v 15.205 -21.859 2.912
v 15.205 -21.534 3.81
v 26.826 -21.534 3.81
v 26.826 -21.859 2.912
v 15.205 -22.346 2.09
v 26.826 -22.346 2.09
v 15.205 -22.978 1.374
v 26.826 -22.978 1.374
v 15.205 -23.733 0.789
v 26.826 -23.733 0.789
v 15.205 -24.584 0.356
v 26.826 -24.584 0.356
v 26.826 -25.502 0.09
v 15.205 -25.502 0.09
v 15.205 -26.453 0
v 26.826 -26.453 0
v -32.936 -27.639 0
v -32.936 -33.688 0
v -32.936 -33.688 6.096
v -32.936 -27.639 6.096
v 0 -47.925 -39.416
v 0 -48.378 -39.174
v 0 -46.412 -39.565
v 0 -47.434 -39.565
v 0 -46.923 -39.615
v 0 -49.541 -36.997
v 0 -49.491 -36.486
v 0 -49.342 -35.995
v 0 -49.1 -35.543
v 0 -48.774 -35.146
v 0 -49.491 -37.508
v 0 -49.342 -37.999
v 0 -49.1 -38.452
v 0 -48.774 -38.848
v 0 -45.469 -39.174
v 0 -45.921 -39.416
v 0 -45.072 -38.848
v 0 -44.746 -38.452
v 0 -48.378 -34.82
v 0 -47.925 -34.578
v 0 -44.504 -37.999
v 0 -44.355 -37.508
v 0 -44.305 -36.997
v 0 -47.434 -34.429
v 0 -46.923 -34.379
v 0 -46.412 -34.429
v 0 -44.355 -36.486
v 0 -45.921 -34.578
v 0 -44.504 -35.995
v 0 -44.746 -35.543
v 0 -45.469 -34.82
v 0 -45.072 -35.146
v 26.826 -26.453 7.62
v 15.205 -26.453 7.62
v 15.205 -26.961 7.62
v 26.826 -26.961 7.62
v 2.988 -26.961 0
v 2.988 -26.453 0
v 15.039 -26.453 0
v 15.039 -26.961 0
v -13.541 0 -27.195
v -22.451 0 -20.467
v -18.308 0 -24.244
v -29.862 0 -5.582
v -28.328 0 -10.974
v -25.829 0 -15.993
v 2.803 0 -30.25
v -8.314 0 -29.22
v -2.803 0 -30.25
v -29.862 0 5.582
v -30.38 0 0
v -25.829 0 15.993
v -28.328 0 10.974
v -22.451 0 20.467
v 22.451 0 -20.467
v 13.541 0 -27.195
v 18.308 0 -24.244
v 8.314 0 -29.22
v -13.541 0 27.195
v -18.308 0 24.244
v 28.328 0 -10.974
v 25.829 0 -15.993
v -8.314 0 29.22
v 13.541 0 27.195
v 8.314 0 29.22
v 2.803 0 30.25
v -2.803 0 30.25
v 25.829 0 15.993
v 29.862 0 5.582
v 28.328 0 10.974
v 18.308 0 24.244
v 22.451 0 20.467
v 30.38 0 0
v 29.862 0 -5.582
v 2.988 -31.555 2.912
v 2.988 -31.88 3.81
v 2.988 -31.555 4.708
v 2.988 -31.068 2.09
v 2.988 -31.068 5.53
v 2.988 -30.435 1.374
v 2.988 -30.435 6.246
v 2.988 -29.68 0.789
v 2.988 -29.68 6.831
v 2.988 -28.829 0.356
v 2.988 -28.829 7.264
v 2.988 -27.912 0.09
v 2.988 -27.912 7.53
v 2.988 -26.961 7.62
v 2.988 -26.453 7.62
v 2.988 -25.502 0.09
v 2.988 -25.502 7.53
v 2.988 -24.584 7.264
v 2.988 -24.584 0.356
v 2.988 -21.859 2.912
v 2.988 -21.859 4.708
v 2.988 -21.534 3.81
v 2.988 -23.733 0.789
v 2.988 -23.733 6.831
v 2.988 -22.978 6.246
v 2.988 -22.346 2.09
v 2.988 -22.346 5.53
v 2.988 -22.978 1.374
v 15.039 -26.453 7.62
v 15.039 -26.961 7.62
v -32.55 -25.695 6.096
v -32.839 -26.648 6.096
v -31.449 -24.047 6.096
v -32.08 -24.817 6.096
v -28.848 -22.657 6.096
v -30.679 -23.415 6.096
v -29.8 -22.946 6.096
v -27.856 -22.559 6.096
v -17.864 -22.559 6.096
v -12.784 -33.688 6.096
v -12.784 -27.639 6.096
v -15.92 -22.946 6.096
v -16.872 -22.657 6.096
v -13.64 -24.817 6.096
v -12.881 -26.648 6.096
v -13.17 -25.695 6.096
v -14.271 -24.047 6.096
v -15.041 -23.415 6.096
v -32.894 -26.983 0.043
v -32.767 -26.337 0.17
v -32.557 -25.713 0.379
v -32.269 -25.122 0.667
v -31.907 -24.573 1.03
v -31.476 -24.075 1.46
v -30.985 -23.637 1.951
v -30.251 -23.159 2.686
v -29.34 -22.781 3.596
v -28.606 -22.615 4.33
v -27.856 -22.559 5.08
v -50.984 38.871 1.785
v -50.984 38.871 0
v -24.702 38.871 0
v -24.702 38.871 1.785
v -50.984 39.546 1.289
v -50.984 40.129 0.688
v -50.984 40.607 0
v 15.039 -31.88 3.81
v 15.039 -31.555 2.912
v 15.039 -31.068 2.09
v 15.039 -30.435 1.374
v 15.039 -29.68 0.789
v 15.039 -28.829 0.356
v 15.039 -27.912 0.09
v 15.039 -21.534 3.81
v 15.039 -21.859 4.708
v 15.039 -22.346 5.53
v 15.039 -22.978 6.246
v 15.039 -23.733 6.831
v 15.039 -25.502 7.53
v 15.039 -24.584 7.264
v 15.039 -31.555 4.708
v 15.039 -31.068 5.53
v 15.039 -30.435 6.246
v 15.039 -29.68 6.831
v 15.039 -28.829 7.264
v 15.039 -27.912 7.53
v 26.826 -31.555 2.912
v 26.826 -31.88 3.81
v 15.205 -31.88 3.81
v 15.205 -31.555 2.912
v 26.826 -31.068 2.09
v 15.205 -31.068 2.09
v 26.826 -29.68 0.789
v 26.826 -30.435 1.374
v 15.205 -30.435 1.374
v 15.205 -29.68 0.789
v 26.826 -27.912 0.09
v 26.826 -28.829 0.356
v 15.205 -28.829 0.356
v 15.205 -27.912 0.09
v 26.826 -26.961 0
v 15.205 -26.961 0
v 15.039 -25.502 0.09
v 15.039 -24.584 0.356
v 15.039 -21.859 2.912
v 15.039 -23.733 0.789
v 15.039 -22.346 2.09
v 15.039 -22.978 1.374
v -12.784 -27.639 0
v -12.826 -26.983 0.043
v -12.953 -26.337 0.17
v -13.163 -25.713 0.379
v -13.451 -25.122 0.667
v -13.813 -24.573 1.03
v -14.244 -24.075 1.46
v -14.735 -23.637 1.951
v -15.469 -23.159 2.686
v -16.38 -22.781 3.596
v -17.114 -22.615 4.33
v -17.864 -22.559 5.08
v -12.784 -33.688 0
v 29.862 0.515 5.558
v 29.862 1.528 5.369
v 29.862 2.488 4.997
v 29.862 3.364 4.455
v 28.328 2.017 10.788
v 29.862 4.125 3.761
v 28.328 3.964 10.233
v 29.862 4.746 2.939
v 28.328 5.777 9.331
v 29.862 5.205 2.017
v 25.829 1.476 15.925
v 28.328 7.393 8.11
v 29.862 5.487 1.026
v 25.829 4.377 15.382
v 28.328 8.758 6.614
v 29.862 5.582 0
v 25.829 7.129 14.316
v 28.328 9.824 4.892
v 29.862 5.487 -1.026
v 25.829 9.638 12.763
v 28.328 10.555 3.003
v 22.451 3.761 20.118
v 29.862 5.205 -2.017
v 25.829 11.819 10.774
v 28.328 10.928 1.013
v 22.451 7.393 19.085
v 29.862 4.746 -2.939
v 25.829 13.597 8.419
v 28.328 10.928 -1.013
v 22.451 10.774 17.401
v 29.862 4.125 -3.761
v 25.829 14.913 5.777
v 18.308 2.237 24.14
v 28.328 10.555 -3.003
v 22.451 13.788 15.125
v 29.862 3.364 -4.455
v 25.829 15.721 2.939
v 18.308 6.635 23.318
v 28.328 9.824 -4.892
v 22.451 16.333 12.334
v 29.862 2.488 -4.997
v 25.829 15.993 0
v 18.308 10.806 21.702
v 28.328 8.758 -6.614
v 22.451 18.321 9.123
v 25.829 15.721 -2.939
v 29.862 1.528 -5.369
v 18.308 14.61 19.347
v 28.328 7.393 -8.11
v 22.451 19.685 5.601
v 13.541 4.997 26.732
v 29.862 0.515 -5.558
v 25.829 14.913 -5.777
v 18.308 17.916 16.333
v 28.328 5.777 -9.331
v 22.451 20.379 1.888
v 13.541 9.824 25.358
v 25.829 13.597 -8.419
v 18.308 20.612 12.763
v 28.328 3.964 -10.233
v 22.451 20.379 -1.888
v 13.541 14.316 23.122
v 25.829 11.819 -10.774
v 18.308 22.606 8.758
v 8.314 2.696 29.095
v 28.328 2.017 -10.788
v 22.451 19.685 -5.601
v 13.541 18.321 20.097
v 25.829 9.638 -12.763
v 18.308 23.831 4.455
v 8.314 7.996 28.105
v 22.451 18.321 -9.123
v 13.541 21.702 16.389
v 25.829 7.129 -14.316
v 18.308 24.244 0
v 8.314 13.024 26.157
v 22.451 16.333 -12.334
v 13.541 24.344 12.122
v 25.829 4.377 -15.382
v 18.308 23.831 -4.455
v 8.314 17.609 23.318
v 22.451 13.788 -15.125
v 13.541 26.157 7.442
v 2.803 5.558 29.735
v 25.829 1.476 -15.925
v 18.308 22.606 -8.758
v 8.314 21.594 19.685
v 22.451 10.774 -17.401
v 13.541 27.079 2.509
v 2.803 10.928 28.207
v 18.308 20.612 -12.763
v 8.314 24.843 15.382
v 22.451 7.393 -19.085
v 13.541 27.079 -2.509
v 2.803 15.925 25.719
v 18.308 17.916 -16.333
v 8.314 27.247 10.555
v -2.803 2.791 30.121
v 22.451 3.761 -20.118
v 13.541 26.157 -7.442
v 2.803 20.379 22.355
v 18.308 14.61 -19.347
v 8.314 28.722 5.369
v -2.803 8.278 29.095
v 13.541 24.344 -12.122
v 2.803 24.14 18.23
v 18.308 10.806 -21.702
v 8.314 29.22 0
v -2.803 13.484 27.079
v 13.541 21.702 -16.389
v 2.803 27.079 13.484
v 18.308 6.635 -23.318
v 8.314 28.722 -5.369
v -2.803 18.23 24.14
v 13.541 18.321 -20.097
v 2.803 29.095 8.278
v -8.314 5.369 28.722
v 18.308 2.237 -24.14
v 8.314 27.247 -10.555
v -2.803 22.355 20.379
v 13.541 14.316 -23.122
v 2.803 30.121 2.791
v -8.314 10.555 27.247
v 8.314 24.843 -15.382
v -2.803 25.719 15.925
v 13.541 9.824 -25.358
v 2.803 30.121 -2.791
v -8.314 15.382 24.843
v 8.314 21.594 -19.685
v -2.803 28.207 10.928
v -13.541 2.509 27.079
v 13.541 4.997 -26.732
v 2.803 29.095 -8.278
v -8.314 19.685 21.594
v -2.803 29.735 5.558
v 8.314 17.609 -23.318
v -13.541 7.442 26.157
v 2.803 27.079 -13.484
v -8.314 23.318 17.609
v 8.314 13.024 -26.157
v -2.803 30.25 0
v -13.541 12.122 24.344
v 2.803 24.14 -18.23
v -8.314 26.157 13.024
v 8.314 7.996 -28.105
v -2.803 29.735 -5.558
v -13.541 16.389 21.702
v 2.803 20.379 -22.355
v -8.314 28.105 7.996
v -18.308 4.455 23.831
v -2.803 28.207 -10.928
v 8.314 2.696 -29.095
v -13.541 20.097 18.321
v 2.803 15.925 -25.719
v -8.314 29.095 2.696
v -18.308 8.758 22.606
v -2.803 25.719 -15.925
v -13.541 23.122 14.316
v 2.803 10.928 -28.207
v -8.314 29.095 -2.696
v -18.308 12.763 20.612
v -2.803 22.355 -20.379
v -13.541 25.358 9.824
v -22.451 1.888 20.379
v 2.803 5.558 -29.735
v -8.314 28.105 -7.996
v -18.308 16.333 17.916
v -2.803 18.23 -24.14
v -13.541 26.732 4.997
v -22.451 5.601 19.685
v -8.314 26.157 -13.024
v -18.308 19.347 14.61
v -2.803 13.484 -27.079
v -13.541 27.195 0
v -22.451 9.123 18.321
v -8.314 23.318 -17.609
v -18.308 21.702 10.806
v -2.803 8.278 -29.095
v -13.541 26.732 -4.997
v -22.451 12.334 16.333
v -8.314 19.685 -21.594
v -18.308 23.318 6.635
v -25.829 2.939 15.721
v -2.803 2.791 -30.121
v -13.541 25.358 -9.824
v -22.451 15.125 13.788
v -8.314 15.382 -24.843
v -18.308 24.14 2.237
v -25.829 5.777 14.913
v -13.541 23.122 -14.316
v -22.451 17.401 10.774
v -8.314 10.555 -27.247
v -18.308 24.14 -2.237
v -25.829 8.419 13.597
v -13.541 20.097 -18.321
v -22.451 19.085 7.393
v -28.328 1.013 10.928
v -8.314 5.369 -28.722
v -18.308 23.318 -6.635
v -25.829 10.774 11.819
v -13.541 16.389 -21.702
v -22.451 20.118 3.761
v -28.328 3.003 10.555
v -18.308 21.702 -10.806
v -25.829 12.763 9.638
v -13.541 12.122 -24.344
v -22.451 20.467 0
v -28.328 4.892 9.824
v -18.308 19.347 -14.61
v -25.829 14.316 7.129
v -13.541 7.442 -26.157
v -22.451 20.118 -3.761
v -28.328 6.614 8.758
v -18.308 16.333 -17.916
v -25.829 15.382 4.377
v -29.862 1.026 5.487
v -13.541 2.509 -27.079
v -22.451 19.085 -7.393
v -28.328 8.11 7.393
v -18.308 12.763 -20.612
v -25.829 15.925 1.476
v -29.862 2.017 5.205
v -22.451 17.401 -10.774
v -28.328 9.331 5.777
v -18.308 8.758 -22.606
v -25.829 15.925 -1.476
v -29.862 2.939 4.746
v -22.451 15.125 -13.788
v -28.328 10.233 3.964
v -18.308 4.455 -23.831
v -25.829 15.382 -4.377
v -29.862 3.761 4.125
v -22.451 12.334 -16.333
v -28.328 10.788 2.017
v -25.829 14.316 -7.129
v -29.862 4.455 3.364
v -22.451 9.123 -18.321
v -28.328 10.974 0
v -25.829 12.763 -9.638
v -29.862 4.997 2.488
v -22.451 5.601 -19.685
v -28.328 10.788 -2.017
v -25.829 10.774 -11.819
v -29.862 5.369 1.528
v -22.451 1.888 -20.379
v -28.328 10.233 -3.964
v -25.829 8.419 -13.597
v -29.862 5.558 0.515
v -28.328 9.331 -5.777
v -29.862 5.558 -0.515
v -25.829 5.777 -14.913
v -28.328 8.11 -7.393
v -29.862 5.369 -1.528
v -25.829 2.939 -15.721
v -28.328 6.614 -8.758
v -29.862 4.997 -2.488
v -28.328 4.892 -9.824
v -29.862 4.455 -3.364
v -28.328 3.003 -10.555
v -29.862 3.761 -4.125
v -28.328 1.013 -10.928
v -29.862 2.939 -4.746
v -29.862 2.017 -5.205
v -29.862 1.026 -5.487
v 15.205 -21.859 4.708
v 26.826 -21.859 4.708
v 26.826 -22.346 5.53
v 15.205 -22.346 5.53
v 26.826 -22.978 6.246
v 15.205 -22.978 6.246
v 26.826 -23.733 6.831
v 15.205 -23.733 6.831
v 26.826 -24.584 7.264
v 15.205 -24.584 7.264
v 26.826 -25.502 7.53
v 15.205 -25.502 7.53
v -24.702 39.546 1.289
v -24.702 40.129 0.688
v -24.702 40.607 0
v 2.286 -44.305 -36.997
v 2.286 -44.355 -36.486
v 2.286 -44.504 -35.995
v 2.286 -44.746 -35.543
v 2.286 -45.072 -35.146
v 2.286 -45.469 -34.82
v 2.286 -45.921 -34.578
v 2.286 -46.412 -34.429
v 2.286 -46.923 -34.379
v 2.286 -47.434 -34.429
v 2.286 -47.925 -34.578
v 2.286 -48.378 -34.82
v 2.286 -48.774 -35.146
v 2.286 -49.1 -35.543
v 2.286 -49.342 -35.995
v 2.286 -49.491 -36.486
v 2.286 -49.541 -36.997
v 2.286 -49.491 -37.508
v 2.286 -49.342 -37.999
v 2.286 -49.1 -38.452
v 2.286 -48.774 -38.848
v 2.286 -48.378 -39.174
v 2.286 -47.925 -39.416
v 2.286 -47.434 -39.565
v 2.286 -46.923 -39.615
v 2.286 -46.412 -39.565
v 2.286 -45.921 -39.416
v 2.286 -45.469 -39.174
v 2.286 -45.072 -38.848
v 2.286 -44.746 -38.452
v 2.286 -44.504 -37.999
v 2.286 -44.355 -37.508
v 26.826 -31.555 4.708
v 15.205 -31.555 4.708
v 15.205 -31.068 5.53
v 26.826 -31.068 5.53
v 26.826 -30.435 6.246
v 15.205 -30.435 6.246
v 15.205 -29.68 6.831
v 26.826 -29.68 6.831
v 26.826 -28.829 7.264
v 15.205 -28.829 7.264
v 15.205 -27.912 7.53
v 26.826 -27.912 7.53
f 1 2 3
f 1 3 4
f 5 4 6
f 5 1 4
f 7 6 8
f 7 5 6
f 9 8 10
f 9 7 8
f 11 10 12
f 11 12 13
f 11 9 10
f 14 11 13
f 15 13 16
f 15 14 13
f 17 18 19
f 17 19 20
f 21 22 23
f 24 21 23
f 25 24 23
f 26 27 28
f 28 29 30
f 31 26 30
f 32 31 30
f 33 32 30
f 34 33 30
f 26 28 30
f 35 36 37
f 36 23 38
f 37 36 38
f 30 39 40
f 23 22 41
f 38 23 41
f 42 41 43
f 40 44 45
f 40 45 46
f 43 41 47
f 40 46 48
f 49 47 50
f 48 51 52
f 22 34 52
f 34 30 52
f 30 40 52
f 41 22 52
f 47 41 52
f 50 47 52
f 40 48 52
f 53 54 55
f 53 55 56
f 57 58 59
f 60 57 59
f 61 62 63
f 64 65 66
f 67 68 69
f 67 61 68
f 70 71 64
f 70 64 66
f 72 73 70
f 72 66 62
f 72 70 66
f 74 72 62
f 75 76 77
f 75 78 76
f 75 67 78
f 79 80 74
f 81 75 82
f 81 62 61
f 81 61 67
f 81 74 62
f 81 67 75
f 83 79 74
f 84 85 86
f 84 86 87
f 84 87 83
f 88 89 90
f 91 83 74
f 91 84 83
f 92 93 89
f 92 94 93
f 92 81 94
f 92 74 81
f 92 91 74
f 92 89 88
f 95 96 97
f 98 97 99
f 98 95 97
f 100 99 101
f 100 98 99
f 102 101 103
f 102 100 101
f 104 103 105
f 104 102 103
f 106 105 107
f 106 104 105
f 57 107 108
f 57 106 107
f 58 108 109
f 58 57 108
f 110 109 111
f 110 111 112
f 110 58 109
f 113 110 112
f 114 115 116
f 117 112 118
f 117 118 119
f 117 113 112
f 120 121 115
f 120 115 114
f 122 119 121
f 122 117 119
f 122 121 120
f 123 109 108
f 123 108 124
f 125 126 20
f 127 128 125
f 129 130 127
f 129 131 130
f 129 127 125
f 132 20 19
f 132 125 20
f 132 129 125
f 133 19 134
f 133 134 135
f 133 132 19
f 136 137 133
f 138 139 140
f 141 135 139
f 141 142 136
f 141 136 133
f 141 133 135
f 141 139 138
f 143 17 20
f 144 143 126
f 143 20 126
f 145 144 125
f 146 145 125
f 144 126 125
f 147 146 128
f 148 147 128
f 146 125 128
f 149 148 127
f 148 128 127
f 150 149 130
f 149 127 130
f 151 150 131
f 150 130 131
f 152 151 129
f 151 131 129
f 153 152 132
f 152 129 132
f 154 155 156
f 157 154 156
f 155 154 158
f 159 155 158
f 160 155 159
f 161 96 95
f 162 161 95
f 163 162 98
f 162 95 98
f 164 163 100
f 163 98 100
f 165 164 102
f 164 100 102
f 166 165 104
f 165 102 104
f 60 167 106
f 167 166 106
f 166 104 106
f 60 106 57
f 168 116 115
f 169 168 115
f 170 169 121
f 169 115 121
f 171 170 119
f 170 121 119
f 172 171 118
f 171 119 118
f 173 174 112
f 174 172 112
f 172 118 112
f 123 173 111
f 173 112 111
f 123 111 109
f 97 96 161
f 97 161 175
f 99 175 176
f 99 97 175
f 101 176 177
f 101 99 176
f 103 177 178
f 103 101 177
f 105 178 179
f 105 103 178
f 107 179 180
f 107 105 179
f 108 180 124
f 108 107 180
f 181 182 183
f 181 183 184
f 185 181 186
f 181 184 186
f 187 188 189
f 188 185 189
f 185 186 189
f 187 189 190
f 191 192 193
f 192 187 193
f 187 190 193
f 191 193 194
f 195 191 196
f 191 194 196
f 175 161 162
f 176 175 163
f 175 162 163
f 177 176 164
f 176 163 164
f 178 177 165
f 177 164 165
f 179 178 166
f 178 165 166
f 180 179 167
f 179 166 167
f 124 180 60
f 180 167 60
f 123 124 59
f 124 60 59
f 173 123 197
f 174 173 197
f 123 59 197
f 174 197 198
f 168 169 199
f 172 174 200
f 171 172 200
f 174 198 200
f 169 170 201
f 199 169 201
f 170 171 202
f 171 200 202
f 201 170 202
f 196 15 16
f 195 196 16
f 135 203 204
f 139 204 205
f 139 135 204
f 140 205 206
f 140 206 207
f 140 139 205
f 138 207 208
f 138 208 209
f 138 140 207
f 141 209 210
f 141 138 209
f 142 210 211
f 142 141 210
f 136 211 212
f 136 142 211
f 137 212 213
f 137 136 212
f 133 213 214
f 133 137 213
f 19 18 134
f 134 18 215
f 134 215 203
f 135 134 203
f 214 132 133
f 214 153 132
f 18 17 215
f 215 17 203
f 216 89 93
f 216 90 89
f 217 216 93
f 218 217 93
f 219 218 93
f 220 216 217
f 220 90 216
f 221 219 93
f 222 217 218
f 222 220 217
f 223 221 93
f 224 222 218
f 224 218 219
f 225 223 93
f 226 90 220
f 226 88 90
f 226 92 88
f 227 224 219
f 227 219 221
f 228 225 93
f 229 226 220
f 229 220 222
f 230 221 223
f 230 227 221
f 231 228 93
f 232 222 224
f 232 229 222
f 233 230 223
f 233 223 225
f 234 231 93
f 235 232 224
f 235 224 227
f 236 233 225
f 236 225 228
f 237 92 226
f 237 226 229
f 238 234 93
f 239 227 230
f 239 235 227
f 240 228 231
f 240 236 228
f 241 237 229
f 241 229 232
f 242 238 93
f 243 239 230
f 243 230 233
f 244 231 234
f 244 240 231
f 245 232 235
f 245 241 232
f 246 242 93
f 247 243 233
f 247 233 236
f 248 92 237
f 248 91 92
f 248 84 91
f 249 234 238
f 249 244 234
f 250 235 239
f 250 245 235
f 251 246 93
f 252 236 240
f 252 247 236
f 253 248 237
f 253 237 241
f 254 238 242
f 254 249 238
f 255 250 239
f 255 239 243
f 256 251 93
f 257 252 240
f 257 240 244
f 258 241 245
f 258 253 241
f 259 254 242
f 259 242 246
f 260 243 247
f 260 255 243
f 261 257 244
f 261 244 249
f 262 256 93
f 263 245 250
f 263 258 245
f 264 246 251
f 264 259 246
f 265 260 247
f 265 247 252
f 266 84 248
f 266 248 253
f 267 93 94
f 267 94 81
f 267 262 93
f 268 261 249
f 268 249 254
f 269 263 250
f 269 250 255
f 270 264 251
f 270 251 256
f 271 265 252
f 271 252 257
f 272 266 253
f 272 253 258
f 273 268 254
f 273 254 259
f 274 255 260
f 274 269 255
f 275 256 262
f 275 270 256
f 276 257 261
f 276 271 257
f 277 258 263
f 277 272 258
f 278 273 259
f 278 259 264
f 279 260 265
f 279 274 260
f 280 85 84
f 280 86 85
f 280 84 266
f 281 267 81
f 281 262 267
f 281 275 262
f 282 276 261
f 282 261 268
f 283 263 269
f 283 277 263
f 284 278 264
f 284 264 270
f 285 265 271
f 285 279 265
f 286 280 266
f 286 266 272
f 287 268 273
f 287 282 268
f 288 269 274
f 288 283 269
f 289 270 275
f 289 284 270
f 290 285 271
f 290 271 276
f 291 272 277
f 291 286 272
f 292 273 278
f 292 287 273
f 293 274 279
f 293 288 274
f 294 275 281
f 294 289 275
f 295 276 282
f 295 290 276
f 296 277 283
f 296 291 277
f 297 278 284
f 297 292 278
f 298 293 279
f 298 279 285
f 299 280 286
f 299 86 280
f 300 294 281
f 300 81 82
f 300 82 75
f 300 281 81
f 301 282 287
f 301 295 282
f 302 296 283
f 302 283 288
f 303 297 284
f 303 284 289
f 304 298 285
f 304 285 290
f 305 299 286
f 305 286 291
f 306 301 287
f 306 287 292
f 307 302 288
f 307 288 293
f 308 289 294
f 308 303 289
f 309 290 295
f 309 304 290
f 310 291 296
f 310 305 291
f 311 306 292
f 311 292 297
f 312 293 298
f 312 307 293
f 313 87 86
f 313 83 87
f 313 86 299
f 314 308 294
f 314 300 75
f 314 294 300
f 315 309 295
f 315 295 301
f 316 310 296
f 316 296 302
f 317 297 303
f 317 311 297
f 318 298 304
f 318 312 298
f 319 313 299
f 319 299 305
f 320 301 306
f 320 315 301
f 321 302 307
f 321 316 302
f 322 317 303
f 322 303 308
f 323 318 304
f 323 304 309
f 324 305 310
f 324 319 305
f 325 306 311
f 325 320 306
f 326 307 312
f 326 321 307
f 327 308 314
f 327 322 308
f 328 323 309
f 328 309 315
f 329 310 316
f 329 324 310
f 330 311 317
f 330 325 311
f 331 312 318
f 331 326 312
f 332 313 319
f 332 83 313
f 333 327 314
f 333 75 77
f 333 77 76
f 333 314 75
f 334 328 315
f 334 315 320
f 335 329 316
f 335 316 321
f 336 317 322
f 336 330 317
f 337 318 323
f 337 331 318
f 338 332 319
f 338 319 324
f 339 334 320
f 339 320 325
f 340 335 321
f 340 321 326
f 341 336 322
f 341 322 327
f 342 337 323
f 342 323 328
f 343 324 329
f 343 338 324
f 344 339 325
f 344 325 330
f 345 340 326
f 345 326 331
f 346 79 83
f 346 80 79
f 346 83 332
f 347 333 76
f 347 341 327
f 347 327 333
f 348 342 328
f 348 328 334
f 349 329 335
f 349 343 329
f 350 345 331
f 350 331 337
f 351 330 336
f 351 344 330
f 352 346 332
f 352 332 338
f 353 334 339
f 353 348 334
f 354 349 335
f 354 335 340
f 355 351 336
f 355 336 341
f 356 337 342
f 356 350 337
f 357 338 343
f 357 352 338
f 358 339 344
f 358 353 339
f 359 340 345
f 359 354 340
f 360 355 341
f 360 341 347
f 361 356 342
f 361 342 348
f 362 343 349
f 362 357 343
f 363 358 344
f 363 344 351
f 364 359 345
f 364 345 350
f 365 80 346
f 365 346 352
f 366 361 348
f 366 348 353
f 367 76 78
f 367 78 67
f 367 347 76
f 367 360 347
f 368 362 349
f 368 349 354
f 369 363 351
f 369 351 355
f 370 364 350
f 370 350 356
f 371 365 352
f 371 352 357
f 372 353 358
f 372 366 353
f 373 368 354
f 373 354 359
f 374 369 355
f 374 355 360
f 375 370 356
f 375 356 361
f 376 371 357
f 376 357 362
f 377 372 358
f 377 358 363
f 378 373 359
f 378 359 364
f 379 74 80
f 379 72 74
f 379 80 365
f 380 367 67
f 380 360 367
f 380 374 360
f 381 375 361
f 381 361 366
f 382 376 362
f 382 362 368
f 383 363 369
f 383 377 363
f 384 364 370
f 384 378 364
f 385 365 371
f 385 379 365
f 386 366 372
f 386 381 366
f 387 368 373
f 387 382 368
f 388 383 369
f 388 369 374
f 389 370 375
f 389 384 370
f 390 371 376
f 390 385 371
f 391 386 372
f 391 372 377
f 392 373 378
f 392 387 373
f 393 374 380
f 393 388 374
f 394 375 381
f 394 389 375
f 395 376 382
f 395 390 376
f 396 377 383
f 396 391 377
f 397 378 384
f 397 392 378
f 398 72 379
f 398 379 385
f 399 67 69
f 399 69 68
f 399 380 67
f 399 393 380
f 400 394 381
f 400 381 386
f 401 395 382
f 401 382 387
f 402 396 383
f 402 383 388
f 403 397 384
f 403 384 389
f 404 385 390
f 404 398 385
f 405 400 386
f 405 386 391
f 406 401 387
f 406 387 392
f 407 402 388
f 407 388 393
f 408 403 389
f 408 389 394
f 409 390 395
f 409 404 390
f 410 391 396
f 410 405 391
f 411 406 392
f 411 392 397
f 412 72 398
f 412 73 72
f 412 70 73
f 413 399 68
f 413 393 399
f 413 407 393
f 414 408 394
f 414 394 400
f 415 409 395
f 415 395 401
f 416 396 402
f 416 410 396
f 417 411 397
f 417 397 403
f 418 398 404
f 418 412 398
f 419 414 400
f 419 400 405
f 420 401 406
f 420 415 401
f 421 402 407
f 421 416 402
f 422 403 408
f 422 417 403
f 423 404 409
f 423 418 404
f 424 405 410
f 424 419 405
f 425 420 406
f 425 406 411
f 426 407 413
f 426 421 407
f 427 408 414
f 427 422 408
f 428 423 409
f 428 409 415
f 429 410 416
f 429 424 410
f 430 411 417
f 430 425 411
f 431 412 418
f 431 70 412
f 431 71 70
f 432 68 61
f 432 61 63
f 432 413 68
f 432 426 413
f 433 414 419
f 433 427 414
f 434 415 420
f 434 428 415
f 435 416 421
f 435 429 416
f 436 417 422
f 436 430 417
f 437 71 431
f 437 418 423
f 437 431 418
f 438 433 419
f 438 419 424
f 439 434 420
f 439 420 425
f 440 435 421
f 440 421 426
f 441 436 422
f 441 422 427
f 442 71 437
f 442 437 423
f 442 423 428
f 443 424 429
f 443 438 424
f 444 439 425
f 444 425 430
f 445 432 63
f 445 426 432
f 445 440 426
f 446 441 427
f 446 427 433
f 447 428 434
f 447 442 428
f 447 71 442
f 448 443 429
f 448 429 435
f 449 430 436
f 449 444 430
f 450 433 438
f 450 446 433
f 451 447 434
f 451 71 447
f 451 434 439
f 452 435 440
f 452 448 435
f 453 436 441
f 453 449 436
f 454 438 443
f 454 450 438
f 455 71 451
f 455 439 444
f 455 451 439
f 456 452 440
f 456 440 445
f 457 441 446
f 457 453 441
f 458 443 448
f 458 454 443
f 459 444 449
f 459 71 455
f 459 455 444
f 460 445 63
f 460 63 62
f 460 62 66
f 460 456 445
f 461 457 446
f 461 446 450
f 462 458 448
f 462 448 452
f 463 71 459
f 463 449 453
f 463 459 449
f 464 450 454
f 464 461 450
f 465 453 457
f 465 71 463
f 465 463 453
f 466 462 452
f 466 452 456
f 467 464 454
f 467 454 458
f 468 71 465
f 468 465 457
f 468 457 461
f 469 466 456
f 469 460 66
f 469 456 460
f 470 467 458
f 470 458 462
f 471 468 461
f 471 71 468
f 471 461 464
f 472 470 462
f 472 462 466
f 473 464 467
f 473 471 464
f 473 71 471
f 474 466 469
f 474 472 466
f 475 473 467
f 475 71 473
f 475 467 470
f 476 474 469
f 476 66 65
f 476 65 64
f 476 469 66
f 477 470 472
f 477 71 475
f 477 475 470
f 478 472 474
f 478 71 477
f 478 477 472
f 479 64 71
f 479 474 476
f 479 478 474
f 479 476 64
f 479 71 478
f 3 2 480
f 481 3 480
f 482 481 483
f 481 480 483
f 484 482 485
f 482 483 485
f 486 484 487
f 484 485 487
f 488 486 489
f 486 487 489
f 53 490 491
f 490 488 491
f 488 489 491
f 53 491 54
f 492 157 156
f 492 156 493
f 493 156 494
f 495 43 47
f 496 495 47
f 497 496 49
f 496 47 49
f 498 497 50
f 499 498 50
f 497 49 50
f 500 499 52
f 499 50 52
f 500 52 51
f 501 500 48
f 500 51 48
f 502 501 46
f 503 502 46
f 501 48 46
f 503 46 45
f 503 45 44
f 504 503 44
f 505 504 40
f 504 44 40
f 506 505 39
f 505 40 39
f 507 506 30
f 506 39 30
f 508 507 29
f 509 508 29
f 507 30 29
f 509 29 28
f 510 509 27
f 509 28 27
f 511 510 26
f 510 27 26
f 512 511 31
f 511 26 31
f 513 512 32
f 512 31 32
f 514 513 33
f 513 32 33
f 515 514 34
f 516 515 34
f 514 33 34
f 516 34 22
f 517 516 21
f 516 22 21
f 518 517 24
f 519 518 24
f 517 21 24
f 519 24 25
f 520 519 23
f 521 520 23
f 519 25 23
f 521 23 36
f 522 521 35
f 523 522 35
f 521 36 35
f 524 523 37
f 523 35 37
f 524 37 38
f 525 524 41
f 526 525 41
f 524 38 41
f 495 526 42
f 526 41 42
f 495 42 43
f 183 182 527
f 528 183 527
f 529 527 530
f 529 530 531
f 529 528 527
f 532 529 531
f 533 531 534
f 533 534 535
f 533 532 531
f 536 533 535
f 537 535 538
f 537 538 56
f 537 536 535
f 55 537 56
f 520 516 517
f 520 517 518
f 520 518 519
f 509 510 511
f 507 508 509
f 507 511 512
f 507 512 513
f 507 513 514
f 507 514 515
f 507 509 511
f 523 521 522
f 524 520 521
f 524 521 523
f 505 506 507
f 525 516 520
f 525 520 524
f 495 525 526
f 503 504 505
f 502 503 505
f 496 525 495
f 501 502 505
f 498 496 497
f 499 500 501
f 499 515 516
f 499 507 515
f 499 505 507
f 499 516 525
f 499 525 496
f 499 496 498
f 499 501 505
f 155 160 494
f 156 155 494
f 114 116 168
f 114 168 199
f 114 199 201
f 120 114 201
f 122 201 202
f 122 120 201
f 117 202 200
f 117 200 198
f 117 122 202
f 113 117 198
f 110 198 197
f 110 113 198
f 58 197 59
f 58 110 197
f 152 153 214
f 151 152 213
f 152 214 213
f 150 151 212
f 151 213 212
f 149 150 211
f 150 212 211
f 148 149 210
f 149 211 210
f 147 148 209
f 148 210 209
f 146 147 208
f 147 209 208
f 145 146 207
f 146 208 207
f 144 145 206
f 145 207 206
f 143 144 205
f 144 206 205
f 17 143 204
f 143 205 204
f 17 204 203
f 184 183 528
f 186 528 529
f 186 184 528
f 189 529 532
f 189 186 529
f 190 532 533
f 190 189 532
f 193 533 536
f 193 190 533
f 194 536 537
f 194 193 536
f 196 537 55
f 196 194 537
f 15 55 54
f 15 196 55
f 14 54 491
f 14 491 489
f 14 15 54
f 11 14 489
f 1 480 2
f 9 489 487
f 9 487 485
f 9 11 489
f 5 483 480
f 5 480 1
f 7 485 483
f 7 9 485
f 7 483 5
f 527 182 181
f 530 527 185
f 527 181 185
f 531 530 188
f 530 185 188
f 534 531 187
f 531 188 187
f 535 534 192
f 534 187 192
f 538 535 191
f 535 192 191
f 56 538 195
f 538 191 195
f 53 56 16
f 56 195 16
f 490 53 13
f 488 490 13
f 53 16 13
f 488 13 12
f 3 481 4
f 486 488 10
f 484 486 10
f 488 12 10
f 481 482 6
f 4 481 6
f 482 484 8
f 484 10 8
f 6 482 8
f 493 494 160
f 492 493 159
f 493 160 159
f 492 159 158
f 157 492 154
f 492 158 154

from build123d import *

# Parameters (mm, degrees)
F1_ANGLE      = 180
F2_W          = 11.6210272536
F2_H          = 10.6681920588
F3_DEPTH      = 7.62
F2_W_2        = 12.0515259914
F4_T1_DEPTH   = 37.0210272536
F4_2_T1_DEPTH = 37.4515259914
F5_R          = 2.6181603729
F6_DEPTH      = 2.286
F7_W          = 20.1528938487
F7_H          = 11.1292116344
F8_DEPTH      = 6.096
F9_R          = 5.08
F10_W         = 26.281952858
F10_H         = 1.7353892326
F11_DEPTH     = 2.54
F12_T1_DEPTH  = 48.2789981141


# Not quite as in the source:
# - a fillet or chamfer that OpenCascade refuses, or shapes differently, is made with other operations: its cross-section is extruded or revolved along the edge and cut away or added


with BuildPart() as f1:
    # F0 (on Front) → F1 (revolve)
    with BuildSketch(Plane.XZ):
        with BuildLine():
            Line((0, 0), (30.3797386587, 0))
            ThreePointArc((30.3797386587, 0), (0, 30.3797386587), (-30.3797386587, 0))
            Line((-30.3797386587, 0), (0, 0))
        make_face()
    revolve(axis=Axis((0, 0, 0), (-1, 0, 0)), revolution_arc=F1_ANGLE)


with BuildPart() as f3:
    # F2 (on Top) → F3 (new body)
    with BuildSketch(Plane.XY):
        with Locations((21.0152794607, -26.7067458481)):
            Rectangle(F2_W, F2_H)
    extrude(amount=F3_DEPTH)

    # F4: fillet of radius 5.08 on 4 edges, made by hand

    # F4_s2 → F4_t1 (cut)
    with BuildSketch(Plane.YZ.offset(2.5047658339)):
        with BuildLine():
            ThreePointArc((-21.3726498187, 5.08), (-22.8605473702, 1.4878975516), (-26.4526498187, 0))
            Line((-26.4526498187, 0), (-21.3726498187, 0))
            Line((-21.3726498187, 0), (-21.3726498187, 5.08))
        make_face()
        with BuildLine():
            ThreePointArc((-32.0408418775, 5.08), (-30.5529443259, 1.4878975516), (-26.9608418775, 0))
            Line((-26.9608418775, 0), (-32.0408418775, 0))
            Line((-32.0408418775, 0), (-32.0408418775, 5.08))
        make_face()
        with BuildLine():
            ThreePointArc((-32.0408418775, 2.54), (-30.5529443259, 6.1321024484), (-26.9608418775, 7.62))
            Line((-26.9608418775, 7.62), (-32.0408418775, 7.62))
            Line((-32.0408418775, 7.62), (-32.0408418775, 2.54))
        make_face()
        with BuildLine():
            ThreePointArc((-21.3726498187, 2.54), (-22.8605473702, 6.1321024484), (-26.4526498187, 7.62))
            Line((-26.4526498187, 7.62), (-21.3726498187, 7.62))
            Line((-21.3726498187, 7.62), (-21.3726498187, 2.54))
        make_face()
    extrude(amount=F4_T1_DEPTH, mode=Mode.SUBTRACT)


with BuildPart() as f3b:
    # F2 (on Top) → F3, piece 2 (new body)
    with BuildSketch(Plane.XY):
        with Locations((9.0137117077, -26.7067458481)):
            Rectangle(F2_W_2, F2_H)
    extrude(amount=F3_DEPTH)

    # F4#2: fillet of radius 5.08 on 4 edges, made by hand

    # F4_2_s2 → F4_2_t1 (cut)
    with BuildSketch(Plane.YZ.offset(-9.712051288)):
        with BuildLine():
            ThreePointArc((-21.3726498187, 5.08), (-22.8605473702, 1.4878975516), (-26.4526498187, 0))
            Line((-26.4526498187, 0), (-21.3726498187, 0))
            Line((-21.3726498187, 0), (-21.3726498187, 5.08))
        make_face()
        with BuildLine():
            ThreePointArc((-32.0408418775, 5.08), (-30.5529443259, 1.4878975516), (-26.9608418775, 0))
            Line((-26.9608418775, 0), (-32.0408418775, 0))
            Line((-32.0408418775, 0), (-32.0408418775, 5.08))
        make_face()
        with BuildLine():
            ThreePointArc((-32.0408418775, 2.54), (-30.5529443259, 6.1321024484), (-26.9608418775, 7.62))
            Line((-26.9608418775, 7.62), (-32.0408418775, 7.62))
            Line((-32.0408418775, 7.62), (-32.0408418775, 2.54))
        make_face()
        with BuildLine():
            ThreePointArc((-21.3726498187, 2.54), (-22.8605473702, 6.1321024484), (-26.4526498187, 7.62))
            Line((-26.4526498187, 7.62), (-21.3726498187, 7.62))
            Line((-21.3726498187, 7.62), (-21.3726498187, 2.54))
        make_face()
    extrude(amount=F4_2_T1_DEPTH, mode=Mode.SUBTRACT)


with BuildPart() as f6:
    # F5 (on Right) → F6 (new body)
    with BuildSketch(Plane.YZ):
        with Locations((-46.923160553, -36.9971059263)):
            Circle(F5_R)
    extrude(amount=F6_DEPTH)


with BuildPart() as f8:
    # F7 (on Top) → F8 (new body)
    with BuildSketch(Plane.XY):
        with Locations((-22.8599994443, -28.1238164753)):
            Rectangle(F7_W, F7_H)
    extrude(amount=F8_DEPTH)

    # F9
    f9_edges = [f8.edges().sort_by_distance(p)[0] for p in [
        (-12.783553, -22.559211, 3.048),
        (-32.936446, -22.559211, 3.048),
        (-22.859999, -22.559211, 0),
    ]]
    fillet(f9_edges, radius=F9_R)


with BuildPart() as f11:
    # F10 (on Top) → F11 (new body)
    with BuildSketch(Plane.XY):
        with Locations((-37.8428399563, 39.738882333)):
            Rectangle(F10_W, F10_H)
    extrude(amount=F11_DEPTH)

    # F12: fillet of radius 5.08 on 1 edges, made by hand

    # F12_s2 → F12_t1 (cut)
    with BuildSketch(Plane.YZ.offset(-61.9823390133)):
        with BuildLine():
            ThreePointArc((40.6065769494, 0), (38.7471678981, 1.8594090512), (36.2071678981, 2.54))
            Line((36.2071678981, 2.54), (40.6065769494, 2.54))
            Line((40.6065769494, 2.54), (40.6065769494, 0))
        make_face()
    extrude(amount=F12_T1_DEPTH, mode=Mode.SUBTRACT)


solid = Compound([f1.part, f3.part, f3b.part, f6.part, f8.part, f11.part])
